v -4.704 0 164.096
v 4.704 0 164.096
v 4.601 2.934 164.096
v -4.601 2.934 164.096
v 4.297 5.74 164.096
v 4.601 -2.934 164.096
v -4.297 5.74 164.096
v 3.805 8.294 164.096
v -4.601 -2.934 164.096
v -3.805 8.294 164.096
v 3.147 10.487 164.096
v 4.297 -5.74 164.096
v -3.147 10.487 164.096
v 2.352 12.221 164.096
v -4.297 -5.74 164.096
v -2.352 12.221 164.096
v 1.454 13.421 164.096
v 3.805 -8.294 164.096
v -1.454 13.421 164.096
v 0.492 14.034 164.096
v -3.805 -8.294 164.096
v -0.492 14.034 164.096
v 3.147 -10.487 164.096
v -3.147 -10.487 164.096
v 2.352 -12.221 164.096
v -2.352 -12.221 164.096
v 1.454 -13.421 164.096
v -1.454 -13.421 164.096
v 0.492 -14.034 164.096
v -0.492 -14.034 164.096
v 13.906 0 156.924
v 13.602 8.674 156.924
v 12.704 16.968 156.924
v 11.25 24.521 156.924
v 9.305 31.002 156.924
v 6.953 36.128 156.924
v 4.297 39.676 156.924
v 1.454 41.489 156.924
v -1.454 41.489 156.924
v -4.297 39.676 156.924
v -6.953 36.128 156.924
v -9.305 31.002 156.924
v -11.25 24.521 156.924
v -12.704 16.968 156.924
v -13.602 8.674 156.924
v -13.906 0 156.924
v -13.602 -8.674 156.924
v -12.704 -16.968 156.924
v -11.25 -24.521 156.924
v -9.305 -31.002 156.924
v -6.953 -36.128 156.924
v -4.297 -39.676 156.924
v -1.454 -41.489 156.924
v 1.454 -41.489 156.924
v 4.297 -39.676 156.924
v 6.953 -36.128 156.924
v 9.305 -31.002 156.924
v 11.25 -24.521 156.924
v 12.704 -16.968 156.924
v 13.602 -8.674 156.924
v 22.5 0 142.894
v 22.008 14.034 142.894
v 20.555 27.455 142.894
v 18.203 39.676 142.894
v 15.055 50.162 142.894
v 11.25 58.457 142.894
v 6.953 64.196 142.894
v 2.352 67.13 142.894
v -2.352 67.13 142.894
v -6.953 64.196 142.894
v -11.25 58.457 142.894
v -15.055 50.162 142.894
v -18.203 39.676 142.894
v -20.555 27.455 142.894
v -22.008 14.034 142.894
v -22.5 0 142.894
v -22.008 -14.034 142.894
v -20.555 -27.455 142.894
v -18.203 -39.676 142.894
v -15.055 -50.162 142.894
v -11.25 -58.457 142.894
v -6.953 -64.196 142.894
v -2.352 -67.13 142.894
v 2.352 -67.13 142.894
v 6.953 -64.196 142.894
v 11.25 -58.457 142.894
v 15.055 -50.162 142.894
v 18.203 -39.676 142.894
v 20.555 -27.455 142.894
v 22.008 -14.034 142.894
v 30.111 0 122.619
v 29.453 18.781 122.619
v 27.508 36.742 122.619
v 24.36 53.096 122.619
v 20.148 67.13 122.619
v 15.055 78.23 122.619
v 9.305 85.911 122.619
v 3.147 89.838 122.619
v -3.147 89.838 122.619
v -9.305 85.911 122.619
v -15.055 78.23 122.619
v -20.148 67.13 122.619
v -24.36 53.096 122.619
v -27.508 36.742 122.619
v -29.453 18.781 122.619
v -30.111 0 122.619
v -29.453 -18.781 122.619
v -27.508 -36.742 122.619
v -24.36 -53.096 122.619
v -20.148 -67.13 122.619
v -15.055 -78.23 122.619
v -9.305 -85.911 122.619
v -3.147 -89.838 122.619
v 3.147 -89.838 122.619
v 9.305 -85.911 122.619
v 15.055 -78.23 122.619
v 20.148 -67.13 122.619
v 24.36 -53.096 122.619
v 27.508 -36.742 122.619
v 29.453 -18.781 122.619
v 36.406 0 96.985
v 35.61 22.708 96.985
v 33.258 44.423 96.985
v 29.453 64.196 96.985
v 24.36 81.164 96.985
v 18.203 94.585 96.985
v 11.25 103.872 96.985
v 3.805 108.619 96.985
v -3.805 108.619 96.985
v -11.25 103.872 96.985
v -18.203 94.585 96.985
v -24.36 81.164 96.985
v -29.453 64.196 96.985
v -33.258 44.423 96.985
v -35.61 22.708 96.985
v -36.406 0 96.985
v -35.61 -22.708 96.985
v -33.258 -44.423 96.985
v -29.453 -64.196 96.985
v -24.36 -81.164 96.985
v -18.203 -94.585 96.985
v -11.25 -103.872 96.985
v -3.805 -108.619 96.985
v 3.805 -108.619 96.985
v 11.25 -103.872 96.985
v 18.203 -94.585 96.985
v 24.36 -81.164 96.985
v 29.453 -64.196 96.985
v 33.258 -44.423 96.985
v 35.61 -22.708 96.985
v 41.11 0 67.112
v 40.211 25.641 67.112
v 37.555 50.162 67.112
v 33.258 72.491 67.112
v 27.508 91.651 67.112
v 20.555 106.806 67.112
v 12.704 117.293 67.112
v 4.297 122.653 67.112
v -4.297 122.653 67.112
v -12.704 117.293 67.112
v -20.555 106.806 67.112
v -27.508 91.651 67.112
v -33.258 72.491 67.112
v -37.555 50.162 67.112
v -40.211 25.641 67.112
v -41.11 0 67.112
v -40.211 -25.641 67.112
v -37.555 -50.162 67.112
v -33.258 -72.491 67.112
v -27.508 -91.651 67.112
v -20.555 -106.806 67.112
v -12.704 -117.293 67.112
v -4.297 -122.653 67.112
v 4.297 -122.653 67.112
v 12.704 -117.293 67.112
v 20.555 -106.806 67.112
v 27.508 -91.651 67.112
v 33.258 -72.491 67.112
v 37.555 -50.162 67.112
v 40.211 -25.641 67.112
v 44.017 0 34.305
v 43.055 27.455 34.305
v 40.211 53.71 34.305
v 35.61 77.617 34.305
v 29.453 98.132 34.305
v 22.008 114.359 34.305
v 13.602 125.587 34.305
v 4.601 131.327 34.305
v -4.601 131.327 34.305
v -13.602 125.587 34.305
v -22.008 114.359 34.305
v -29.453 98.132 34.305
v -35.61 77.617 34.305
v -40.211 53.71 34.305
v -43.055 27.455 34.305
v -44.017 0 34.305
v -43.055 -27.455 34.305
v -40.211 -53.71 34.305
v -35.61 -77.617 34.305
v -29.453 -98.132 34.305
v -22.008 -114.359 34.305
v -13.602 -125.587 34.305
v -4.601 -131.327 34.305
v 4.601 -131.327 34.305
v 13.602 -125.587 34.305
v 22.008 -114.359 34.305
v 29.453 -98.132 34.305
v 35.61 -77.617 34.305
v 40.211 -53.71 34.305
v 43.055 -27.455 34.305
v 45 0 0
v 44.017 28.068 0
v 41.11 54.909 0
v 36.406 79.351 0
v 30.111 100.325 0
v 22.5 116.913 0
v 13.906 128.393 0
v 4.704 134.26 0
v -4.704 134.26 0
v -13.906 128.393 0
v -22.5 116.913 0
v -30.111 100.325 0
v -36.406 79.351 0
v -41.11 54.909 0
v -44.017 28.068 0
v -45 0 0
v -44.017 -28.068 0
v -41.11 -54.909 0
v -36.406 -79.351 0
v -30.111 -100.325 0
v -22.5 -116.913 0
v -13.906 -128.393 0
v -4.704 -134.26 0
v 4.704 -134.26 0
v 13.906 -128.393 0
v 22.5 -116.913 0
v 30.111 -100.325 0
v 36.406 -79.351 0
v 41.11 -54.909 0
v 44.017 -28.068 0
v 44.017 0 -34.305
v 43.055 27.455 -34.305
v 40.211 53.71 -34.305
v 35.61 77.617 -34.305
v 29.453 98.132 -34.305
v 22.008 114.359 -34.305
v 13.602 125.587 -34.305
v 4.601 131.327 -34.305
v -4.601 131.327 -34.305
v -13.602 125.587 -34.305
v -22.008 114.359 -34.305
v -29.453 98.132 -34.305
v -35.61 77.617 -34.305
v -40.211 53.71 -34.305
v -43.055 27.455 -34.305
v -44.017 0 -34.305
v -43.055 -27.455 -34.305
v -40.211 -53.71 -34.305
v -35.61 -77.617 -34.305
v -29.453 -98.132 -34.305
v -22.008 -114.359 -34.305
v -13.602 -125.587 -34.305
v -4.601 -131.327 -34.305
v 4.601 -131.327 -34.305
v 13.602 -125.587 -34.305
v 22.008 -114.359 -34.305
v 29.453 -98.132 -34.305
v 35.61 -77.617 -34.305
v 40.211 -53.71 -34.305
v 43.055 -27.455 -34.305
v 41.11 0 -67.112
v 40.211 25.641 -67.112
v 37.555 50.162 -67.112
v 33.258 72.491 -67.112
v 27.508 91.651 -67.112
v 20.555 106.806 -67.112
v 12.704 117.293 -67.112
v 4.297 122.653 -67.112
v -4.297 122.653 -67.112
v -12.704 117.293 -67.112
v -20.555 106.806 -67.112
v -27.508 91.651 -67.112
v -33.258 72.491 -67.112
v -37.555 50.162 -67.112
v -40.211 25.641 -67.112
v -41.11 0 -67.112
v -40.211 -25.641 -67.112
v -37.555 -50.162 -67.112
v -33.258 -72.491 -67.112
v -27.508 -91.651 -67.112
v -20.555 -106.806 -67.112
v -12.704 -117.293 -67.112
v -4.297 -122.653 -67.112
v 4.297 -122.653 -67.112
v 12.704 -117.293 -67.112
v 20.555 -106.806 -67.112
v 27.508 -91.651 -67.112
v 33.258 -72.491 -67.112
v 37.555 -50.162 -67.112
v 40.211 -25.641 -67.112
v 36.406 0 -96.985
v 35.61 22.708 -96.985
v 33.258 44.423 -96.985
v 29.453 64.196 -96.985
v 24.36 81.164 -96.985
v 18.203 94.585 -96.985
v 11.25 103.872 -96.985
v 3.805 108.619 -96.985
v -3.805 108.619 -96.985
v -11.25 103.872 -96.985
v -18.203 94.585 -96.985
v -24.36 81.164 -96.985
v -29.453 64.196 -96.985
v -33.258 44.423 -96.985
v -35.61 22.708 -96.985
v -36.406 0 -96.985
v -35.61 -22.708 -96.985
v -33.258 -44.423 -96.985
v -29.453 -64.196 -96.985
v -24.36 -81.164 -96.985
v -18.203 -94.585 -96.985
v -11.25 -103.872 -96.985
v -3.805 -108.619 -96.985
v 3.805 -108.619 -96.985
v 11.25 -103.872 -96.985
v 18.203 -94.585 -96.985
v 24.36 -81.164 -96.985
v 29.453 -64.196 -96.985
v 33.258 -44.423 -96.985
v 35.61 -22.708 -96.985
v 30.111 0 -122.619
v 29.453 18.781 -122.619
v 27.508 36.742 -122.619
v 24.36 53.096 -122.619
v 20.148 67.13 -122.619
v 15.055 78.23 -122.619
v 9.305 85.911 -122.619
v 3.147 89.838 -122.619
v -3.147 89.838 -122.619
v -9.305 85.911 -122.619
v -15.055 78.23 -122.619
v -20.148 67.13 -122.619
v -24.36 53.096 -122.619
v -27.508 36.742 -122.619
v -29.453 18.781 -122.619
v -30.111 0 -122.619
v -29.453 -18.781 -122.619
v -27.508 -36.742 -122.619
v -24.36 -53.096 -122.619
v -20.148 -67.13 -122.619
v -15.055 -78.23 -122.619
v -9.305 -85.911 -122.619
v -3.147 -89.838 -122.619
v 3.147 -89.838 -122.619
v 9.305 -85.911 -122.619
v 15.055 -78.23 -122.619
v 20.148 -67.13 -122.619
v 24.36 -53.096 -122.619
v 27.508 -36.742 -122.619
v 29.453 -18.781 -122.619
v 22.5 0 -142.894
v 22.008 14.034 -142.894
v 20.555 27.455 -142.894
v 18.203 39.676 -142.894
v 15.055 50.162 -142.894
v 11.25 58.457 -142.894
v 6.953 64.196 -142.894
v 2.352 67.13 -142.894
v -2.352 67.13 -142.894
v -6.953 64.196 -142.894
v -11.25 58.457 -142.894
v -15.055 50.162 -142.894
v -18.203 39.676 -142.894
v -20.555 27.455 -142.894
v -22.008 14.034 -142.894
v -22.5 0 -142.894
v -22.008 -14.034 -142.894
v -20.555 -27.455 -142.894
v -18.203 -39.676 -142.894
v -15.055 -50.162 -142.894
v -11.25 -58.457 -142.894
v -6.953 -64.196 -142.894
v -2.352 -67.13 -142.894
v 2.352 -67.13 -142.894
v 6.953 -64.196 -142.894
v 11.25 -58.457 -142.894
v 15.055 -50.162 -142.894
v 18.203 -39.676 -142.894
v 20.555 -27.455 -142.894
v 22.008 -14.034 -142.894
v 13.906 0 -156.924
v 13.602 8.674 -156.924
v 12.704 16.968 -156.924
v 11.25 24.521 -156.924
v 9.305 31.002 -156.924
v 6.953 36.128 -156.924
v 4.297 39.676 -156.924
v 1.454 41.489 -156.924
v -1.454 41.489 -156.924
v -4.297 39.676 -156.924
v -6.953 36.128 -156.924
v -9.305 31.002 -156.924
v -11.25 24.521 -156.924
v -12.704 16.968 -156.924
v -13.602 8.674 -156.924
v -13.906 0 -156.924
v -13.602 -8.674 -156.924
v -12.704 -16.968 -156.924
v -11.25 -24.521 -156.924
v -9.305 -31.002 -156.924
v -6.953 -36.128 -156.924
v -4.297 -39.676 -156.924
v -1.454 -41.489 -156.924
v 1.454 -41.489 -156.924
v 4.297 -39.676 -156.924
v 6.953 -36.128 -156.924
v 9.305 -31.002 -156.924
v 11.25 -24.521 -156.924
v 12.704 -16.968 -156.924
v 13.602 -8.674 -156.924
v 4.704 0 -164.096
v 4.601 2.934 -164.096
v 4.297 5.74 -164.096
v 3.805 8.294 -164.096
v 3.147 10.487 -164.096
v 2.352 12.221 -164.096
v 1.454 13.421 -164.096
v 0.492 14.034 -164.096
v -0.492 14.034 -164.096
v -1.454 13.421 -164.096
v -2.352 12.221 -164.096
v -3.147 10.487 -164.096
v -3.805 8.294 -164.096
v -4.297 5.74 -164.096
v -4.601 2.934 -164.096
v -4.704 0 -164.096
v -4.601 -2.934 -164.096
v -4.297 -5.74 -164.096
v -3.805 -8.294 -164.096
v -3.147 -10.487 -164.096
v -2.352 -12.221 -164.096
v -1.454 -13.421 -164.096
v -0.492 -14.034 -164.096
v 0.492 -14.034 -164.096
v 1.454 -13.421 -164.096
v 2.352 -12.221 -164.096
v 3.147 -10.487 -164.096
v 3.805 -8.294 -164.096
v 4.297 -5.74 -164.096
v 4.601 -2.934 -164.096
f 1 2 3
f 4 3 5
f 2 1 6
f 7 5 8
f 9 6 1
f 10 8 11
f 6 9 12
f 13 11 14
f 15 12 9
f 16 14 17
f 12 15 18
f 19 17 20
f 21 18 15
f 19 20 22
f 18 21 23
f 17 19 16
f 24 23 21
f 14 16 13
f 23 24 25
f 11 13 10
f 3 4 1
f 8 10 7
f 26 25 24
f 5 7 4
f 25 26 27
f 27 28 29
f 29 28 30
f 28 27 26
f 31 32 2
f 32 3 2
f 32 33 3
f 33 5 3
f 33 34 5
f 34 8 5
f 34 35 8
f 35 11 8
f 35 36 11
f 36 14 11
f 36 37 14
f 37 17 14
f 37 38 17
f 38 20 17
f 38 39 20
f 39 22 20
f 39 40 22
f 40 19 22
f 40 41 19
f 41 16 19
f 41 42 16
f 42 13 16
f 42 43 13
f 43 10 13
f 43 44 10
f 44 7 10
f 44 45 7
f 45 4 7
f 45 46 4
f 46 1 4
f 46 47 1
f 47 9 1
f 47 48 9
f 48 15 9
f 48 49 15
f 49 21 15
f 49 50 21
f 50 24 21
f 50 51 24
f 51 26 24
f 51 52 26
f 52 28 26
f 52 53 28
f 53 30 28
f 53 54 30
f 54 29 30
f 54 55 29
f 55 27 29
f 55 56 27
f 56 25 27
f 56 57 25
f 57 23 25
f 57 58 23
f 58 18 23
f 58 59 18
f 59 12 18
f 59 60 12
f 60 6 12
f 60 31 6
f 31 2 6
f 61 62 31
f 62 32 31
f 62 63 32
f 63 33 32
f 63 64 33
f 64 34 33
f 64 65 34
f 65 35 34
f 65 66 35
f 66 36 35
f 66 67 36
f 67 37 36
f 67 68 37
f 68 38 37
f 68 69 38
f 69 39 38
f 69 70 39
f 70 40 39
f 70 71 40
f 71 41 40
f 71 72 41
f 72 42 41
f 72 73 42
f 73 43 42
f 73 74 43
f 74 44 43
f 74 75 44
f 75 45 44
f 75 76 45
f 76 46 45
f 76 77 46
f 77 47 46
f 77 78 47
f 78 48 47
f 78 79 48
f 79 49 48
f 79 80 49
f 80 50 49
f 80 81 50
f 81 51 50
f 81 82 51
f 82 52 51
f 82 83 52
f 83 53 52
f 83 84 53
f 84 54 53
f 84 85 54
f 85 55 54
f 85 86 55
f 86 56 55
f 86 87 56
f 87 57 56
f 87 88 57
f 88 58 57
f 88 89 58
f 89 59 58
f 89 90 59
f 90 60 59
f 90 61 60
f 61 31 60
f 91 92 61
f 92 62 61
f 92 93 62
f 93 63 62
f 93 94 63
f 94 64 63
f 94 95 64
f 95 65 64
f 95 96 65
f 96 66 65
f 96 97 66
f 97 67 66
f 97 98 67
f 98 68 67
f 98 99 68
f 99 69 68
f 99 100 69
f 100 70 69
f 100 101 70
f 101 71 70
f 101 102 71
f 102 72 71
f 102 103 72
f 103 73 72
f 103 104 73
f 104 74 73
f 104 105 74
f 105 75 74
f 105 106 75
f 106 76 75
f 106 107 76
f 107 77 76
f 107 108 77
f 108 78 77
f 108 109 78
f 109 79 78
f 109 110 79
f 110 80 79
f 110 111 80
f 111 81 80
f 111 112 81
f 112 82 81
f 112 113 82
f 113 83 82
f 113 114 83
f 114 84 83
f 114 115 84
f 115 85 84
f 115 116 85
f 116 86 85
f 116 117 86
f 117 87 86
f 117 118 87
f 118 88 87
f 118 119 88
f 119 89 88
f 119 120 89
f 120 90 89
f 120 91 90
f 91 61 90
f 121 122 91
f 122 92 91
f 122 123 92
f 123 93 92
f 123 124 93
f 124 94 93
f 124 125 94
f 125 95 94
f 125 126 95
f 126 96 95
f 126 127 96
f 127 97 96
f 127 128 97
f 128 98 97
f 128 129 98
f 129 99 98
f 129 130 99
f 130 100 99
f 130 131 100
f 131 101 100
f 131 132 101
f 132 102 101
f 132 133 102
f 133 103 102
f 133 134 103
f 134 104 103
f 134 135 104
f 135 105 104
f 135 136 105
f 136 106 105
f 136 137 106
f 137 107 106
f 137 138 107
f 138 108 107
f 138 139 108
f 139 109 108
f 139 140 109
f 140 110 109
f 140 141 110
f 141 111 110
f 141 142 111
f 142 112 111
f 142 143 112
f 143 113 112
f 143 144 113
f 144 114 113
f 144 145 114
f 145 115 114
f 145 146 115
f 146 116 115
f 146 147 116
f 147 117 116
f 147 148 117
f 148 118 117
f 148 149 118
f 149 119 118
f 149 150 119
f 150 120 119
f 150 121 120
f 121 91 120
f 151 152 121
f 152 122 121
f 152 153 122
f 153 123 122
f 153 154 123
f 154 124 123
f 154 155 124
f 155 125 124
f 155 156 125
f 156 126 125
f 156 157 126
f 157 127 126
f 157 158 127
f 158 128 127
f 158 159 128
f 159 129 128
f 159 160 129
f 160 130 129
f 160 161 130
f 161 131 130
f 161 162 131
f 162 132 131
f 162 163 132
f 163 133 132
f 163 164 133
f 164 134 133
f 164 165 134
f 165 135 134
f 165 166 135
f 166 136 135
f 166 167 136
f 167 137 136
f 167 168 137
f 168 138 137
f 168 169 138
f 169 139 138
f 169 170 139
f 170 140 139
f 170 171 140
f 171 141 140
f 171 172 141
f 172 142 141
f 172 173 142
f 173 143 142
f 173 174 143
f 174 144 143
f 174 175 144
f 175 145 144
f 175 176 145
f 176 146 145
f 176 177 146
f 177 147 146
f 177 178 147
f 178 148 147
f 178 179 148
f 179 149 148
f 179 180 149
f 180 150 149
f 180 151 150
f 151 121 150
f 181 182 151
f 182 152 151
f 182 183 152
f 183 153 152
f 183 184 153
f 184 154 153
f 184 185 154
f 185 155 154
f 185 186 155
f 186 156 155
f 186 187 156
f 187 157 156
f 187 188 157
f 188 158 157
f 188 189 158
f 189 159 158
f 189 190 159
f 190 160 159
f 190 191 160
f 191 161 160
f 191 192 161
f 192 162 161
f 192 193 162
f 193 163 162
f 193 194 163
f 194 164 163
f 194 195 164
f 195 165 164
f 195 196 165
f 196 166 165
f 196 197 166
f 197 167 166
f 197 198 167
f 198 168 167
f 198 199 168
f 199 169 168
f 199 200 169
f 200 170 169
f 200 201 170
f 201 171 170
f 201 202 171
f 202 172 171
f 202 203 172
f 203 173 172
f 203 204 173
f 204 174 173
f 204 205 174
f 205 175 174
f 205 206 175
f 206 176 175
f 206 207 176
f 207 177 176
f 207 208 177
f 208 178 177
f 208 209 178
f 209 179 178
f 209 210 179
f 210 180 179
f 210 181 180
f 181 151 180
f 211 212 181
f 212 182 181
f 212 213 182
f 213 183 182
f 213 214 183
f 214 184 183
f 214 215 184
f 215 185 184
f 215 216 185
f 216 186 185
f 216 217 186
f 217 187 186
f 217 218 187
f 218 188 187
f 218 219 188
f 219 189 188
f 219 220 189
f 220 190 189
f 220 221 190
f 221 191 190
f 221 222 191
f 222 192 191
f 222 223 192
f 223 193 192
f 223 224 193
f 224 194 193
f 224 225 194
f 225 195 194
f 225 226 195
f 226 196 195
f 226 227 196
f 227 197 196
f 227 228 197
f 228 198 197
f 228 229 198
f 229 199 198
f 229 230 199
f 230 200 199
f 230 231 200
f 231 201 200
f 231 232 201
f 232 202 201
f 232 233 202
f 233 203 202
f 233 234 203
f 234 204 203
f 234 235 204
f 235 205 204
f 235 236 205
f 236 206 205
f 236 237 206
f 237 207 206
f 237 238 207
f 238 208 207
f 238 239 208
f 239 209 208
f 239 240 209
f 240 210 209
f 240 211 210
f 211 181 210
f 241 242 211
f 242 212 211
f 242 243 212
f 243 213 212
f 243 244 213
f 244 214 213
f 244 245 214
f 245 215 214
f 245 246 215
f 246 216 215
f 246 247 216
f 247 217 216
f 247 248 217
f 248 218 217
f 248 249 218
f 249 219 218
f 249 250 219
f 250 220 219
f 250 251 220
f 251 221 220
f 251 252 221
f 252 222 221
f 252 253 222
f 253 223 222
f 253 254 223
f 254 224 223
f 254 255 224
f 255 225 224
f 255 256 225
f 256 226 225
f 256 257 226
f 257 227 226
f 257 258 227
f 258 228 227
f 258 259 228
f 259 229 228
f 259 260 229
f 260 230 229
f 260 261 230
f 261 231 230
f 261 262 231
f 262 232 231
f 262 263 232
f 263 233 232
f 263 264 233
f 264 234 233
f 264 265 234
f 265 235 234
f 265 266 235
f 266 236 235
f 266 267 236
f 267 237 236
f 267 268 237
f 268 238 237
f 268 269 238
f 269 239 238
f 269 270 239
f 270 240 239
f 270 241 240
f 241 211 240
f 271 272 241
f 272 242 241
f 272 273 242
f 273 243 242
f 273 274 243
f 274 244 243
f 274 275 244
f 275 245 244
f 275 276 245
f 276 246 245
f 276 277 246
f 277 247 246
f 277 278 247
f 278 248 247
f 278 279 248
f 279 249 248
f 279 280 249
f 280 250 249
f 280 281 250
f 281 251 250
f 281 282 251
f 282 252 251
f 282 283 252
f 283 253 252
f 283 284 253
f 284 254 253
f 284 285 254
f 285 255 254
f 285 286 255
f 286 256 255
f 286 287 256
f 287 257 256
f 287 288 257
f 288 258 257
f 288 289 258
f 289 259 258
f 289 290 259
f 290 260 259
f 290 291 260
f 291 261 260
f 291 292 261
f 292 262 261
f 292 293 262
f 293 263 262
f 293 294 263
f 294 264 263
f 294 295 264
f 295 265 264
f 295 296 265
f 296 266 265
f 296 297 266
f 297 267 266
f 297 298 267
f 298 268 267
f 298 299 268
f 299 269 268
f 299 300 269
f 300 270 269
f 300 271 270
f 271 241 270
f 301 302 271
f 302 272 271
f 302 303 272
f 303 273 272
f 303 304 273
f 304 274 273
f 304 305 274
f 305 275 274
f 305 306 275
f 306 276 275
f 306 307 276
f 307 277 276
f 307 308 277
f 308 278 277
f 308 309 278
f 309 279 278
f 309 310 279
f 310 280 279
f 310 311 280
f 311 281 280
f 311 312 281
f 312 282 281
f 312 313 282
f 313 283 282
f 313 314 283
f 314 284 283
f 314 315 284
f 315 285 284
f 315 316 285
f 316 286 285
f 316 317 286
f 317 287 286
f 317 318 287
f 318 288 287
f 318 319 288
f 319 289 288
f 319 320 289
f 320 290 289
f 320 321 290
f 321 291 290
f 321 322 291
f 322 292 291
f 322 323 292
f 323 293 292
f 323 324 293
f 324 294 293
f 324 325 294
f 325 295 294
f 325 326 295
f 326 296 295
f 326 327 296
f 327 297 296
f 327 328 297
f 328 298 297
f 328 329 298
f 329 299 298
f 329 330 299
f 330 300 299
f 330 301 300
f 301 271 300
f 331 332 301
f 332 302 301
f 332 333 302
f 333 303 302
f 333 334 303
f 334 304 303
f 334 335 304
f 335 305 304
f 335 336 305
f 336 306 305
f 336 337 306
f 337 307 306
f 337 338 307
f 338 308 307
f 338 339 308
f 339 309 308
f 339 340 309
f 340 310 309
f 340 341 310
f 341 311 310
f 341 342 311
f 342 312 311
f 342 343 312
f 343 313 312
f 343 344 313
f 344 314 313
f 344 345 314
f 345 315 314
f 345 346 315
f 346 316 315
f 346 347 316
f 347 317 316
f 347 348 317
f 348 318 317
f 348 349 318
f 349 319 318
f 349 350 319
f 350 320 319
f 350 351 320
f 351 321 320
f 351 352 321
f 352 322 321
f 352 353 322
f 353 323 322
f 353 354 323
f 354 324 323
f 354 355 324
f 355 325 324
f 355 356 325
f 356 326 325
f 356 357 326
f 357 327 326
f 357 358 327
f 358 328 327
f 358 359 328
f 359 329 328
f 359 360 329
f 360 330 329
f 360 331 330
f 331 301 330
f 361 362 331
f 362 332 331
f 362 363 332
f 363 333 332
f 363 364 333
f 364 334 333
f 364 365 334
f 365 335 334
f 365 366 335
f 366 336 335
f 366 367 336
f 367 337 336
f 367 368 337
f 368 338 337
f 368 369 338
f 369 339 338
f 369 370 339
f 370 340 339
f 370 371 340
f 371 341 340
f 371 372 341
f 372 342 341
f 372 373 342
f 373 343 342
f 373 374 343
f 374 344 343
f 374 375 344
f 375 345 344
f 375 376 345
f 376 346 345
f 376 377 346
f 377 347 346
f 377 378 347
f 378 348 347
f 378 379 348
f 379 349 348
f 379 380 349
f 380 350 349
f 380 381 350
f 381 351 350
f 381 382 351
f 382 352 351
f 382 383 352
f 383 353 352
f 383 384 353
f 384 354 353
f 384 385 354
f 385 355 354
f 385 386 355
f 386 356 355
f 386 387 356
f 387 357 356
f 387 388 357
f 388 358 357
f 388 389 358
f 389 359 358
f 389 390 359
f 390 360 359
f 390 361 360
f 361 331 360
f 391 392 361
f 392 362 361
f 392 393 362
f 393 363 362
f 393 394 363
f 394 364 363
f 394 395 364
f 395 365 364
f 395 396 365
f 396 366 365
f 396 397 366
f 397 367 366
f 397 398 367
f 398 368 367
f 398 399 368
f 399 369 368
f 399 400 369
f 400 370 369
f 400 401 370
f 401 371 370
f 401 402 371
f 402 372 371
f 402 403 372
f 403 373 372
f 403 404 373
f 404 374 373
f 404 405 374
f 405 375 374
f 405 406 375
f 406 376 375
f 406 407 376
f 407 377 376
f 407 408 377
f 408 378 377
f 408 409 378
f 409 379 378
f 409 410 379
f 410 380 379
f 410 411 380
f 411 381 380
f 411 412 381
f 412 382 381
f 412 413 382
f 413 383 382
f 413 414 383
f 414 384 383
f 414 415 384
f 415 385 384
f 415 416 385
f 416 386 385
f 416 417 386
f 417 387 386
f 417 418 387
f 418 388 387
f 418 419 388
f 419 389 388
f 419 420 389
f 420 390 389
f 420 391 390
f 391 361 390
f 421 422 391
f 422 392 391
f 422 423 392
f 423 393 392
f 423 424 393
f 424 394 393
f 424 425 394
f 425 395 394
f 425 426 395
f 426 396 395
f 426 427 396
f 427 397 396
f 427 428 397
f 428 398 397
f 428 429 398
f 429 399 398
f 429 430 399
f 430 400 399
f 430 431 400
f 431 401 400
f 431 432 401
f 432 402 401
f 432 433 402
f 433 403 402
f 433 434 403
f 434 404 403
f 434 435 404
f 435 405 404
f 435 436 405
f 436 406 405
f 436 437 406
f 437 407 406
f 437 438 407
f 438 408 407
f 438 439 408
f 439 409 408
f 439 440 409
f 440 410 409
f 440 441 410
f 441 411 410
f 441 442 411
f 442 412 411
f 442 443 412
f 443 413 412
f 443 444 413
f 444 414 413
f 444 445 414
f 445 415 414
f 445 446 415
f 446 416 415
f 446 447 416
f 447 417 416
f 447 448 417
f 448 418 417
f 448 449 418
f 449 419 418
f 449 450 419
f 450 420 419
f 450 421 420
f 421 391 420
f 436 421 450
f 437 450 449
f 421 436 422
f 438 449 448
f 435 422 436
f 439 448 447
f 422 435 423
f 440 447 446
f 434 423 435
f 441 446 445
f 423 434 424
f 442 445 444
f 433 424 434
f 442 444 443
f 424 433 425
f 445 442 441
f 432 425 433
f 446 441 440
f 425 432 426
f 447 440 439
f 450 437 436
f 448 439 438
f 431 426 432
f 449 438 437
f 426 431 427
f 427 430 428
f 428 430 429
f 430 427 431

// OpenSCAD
// Generated by SolidPython 1.0.1 on 2020-07-29 00:46:45


scale(v = [3, 9, 11]) {
	sphere(r = 15);
}
/***********************************************
*********      SolidPython code:      **********
************************************************
 
# import packages: SolidPython
from solid import *
from solid.utils import *
from itertools import chain, combinations, permutations


class Resize:

    def __init__(self, scad_file):
        self.scad_file = scad_file
        #self.scad_file = import_scad(scad_file)
        # cone/cylinder param:
        self.r1 = 0
        self.r2 = 0
        self.h = 0
        # rectangular prism param:
        self.w = 0
        self.l = 0
        # ellipse param:
        self.r = 0

    # import OpenScad code (file name corresponds to shape)


    # classify shape + parameters
    def assign(self, param1, param2, param3):
        if self.scad_file == 'cone.scad':
            self.r1 = param1
            self.r2 = param2
            self.h = param3
        elif self.scad_file == 'cylinder.scad':
            self.r1 = param1
            self.r2 = param2
            self.h = param3
        elif self.scad_file == 'rectangularPrism.scad':
            self.h = param1
            self.l = param2
            self.w = param3
        else:
            self.r = param1
            self.h = param2

    # resize parameters
    def iterate(self):
        x = range(3, 20, 2)
        i = 1
        if self.scad_file == 'cone.scad':
            tempList = list(permutations(x, 2))
            for temp in tempList:
                param1 = temp[0]
                param2 = temp[1]
                filepath = 'produced_scad_files/' + 'cone' + str(param1) + '_' + str(param2) + '_' + '.scad'
                scad_render_to_file(cylinder(h=param1, r1=param2, r2=0), filepath)

        elif self.scad_file == 'cylinder.scad':
            tempList = list(permutations(x, 3))
            for temp in tempList:
                param1 = temp[0]
                param2 = temp[1]
                filepath = 'produced_scad_files/' + 'cylinder' + str(param1) + '_' + str(param2) + '_' + '.scad'
                scad_render_to_file(cylinder(h=param1, r1=param2, r2=param2), filepath)

        elif self.scad_file == 'rectangularPrism.scad':
            tempList = list(permutations(x, 3))
            for temp in tempList:
                param1 = temp[0]
                param2 = temp[1]
                param3 = temp[2]
                filepath = 'produced_scad_files/' + 'rectangularPrism' + str(param1) + '_' + str(param2) + '_' + str(
                    param3) + '.scad'
                scad_render_to_file(cube(size=(param1, param2, param3)), filepath)

        elif self.scad_file == 'ellipse.scad':
            tempList = list(permutations(x, 4))
            for temp in tempList:
                param1 = temp[0]
                param2 = temp[1]
                param3 = temp[2]
                param4 = temp[3]
                filepath = 'produced_scad_files/' + 'ellipse' + str(param1) + '_' + str(param2) + '_' + str(param3) + '_' + str(param4) + '.scad'
                scad_render_to_file(scale([param1, param2, param3])(sphere(r=param4)), filepath)

    def render_to_scadfile(self):
        scad_render_to_file(scad, 'example.scad') 
 
************************************************/
